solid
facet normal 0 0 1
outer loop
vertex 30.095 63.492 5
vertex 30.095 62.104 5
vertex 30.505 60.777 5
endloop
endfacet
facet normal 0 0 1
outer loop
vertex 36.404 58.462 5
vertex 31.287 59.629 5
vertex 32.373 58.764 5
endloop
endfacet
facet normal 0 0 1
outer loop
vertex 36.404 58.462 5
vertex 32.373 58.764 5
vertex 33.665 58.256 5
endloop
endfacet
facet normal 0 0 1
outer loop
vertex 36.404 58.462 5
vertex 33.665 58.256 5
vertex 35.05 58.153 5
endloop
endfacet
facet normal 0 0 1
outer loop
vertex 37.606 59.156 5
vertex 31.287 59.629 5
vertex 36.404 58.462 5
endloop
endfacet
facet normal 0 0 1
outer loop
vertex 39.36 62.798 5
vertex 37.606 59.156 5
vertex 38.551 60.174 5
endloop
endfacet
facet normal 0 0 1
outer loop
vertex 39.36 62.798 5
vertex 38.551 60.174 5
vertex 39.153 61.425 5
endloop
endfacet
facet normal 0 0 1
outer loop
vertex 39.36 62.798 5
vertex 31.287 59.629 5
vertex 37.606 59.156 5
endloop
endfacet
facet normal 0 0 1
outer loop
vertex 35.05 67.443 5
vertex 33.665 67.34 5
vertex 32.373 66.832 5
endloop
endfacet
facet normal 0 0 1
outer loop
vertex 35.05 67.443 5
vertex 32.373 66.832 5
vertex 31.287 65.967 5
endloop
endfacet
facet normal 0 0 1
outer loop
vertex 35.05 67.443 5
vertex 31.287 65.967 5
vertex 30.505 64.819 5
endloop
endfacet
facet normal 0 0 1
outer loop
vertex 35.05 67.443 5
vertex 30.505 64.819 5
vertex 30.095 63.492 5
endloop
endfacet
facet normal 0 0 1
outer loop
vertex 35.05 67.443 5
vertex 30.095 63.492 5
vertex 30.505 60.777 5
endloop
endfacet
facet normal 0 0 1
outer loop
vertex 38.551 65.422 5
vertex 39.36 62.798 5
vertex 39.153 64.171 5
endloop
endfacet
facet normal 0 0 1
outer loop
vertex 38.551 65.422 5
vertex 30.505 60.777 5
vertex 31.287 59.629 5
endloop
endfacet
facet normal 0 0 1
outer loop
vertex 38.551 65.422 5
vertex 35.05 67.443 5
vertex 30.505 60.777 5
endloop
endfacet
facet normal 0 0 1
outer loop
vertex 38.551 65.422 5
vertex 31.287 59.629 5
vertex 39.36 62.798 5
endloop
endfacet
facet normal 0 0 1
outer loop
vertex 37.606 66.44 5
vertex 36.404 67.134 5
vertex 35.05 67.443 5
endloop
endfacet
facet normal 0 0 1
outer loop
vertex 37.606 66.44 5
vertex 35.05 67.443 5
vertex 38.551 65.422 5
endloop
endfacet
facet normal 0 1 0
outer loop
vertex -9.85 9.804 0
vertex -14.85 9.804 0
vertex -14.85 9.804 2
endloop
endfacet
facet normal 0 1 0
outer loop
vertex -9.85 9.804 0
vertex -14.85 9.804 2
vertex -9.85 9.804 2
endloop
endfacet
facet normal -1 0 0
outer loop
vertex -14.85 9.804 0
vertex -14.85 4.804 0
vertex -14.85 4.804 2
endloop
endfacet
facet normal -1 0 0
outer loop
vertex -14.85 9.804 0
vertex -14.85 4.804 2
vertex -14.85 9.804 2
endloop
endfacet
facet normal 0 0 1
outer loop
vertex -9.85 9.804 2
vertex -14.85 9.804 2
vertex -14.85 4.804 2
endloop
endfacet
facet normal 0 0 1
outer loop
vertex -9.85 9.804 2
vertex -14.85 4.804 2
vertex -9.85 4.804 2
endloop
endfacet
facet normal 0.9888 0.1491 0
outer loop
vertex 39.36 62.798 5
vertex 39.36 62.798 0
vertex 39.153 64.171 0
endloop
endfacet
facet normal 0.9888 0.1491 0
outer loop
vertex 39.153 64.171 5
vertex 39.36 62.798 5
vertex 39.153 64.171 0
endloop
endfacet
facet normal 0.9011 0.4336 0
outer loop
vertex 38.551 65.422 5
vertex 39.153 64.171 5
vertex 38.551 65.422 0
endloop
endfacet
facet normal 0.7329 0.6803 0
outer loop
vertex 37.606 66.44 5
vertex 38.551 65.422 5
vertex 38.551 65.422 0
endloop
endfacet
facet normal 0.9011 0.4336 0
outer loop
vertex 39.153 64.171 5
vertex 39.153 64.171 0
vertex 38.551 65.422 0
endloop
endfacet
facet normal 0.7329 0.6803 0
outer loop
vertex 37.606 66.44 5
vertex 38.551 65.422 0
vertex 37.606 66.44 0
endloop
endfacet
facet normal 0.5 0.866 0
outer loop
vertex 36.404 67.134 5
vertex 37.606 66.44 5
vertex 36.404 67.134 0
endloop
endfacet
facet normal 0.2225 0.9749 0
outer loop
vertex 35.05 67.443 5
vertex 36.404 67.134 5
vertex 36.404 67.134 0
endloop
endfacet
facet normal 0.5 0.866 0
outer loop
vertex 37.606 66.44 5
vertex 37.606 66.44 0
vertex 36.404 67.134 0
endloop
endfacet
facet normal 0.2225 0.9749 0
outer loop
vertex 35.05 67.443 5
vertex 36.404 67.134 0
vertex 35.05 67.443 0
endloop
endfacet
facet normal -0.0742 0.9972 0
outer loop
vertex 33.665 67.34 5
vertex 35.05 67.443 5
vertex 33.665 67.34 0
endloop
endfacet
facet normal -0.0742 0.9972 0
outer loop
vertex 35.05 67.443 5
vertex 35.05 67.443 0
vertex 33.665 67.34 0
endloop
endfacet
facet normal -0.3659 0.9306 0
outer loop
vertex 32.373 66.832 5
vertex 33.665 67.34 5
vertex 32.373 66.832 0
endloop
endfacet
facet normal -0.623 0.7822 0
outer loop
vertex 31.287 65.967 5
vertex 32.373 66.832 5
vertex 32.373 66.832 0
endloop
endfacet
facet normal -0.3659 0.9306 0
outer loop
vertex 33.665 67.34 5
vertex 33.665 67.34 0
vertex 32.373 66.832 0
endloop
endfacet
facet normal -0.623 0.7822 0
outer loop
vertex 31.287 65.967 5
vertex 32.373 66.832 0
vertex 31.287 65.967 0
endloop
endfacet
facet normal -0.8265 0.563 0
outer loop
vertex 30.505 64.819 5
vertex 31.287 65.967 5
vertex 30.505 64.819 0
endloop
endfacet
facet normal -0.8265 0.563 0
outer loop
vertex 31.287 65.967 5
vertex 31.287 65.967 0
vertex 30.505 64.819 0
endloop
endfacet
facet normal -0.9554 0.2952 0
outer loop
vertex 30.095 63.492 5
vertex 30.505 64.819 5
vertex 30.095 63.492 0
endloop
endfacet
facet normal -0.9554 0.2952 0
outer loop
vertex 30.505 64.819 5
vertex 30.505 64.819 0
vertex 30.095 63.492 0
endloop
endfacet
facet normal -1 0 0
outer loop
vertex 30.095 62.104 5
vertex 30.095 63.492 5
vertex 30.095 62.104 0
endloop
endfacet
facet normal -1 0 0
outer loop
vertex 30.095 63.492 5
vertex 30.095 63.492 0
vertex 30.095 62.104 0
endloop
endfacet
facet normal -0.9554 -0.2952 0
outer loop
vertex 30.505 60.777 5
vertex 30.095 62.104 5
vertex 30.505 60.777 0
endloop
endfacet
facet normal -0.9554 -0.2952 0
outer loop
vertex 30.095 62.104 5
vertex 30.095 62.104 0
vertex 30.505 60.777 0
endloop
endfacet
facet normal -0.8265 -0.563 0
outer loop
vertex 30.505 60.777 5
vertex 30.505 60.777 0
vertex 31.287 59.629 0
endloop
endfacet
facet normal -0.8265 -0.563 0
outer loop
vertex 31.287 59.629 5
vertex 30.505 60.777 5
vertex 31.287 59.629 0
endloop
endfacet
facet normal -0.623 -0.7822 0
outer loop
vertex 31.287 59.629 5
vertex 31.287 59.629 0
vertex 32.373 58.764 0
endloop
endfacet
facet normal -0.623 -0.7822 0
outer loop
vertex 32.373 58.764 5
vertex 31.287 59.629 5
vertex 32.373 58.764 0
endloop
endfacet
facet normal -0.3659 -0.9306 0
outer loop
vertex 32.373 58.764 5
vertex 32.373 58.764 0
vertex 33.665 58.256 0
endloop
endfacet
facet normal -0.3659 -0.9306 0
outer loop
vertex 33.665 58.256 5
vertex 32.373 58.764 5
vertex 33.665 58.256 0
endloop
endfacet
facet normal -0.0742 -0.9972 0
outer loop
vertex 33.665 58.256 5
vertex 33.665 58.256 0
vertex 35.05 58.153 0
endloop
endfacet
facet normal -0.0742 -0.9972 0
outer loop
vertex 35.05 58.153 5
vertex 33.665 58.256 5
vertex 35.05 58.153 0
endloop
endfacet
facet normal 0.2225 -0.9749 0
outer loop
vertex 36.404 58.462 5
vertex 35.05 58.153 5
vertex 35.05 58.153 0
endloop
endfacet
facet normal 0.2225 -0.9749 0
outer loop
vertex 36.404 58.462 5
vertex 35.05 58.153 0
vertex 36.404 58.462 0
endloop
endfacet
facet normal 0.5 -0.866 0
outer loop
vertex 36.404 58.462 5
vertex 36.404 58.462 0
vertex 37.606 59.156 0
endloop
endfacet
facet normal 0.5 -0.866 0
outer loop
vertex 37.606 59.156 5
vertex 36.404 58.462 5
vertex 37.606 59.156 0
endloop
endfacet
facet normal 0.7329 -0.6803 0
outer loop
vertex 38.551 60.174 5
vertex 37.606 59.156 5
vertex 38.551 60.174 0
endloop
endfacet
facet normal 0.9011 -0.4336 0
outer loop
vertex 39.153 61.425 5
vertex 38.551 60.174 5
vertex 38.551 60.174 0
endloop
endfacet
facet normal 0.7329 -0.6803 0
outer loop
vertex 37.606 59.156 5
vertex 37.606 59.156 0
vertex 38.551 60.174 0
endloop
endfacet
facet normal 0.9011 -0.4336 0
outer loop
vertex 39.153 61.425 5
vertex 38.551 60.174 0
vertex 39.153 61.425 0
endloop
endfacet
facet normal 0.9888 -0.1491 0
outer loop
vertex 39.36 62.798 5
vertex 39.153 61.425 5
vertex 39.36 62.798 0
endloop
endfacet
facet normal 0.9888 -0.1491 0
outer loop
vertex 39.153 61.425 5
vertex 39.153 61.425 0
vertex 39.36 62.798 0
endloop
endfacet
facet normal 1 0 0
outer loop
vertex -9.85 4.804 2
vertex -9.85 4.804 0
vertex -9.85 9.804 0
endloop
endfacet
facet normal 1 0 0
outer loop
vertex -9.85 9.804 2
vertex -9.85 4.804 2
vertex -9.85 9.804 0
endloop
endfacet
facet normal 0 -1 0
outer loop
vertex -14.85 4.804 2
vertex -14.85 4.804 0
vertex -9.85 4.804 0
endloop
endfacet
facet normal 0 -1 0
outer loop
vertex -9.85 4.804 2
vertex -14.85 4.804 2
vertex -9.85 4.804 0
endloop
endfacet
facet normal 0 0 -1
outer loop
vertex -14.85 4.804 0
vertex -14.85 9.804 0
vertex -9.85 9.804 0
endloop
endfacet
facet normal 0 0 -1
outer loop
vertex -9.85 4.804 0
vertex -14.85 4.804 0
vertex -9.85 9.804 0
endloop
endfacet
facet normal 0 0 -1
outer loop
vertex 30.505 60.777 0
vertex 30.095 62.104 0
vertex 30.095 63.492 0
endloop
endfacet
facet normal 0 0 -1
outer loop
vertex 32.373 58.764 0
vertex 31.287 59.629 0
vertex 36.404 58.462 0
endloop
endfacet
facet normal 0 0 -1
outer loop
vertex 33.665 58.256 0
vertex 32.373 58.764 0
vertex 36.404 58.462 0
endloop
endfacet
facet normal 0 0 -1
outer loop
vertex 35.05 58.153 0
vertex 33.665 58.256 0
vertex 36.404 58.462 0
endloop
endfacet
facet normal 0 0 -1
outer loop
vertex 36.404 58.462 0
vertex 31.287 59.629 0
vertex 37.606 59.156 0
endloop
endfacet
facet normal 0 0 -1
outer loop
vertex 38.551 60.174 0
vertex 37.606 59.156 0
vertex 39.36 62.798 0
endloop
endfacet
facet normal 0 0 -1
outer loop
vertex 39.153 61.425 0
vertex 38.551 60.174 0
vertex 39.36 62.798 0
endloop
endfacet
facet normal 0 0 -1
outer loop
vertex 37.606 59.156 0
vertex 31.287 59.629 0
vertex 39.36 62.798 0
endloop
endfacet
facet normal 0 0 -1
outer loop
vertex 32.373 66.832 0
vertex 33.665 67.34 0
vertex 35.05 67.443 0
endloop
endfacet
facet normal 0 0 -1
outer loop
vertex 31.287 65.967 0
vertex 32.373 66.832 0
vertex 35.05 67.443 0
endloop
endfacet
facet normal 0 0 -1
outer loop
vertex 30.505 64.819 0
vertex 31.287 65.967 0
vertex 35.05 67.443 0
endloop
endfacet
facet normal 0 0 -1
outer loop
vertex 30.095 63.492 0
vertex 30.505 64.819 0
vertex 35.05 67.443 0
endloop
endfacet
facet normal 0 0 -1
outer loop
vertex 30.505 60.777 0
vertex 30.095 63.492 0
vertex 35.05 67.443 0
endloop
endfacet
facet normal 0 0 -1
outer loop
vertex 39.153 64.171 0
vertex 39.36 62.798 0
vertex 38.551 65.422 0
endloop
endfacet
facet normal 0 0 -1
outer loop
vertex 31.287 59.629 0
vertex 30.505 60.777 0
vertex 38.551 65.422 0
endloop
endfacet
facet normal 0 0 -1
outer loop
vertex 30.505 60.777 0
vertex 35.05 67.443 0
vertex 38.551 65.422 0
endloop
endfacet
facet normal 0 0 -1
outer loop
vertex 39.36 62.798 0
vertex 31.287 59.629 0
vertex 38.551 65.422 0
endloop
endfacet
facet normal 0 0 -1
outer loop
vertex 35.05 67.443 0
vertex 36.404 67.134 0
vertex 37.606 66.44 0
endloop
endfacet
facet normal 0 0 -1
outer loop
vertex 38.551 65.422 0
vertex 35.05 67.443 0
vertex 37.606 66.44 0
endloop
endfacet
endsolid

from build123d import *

# Parameters (mm, degrees)
SKETCH004_W  = 5
SKETCH004_H  = 5
PAD002_DEPTH = 2
SKETCH003_R  = 4.658459
PAD001_DEPTH = 5


with BuildPart() as body002:
    # Sketch004 → Pad002 (new body)
    with BuildSketch(Plane.XY):
        with Locations((-12.349656, 7.303812)):
            Rectangle(SKETCH004_W, SKETCH004_H)
    extrude(amount=PAD002_DEPTH)


with BuildPart() as fusion:
    # Sketch003 → Pad001 (new body)
    with BuildSketch(Plane.XY):
        with Locations((34.701851, 62.798054)):
            Circle(SKETCH003_R)
    extrude(amount=PAD001_DEPTH)

    # Fusion: union Body002
    add(body002.part)


solid = fusion.part
